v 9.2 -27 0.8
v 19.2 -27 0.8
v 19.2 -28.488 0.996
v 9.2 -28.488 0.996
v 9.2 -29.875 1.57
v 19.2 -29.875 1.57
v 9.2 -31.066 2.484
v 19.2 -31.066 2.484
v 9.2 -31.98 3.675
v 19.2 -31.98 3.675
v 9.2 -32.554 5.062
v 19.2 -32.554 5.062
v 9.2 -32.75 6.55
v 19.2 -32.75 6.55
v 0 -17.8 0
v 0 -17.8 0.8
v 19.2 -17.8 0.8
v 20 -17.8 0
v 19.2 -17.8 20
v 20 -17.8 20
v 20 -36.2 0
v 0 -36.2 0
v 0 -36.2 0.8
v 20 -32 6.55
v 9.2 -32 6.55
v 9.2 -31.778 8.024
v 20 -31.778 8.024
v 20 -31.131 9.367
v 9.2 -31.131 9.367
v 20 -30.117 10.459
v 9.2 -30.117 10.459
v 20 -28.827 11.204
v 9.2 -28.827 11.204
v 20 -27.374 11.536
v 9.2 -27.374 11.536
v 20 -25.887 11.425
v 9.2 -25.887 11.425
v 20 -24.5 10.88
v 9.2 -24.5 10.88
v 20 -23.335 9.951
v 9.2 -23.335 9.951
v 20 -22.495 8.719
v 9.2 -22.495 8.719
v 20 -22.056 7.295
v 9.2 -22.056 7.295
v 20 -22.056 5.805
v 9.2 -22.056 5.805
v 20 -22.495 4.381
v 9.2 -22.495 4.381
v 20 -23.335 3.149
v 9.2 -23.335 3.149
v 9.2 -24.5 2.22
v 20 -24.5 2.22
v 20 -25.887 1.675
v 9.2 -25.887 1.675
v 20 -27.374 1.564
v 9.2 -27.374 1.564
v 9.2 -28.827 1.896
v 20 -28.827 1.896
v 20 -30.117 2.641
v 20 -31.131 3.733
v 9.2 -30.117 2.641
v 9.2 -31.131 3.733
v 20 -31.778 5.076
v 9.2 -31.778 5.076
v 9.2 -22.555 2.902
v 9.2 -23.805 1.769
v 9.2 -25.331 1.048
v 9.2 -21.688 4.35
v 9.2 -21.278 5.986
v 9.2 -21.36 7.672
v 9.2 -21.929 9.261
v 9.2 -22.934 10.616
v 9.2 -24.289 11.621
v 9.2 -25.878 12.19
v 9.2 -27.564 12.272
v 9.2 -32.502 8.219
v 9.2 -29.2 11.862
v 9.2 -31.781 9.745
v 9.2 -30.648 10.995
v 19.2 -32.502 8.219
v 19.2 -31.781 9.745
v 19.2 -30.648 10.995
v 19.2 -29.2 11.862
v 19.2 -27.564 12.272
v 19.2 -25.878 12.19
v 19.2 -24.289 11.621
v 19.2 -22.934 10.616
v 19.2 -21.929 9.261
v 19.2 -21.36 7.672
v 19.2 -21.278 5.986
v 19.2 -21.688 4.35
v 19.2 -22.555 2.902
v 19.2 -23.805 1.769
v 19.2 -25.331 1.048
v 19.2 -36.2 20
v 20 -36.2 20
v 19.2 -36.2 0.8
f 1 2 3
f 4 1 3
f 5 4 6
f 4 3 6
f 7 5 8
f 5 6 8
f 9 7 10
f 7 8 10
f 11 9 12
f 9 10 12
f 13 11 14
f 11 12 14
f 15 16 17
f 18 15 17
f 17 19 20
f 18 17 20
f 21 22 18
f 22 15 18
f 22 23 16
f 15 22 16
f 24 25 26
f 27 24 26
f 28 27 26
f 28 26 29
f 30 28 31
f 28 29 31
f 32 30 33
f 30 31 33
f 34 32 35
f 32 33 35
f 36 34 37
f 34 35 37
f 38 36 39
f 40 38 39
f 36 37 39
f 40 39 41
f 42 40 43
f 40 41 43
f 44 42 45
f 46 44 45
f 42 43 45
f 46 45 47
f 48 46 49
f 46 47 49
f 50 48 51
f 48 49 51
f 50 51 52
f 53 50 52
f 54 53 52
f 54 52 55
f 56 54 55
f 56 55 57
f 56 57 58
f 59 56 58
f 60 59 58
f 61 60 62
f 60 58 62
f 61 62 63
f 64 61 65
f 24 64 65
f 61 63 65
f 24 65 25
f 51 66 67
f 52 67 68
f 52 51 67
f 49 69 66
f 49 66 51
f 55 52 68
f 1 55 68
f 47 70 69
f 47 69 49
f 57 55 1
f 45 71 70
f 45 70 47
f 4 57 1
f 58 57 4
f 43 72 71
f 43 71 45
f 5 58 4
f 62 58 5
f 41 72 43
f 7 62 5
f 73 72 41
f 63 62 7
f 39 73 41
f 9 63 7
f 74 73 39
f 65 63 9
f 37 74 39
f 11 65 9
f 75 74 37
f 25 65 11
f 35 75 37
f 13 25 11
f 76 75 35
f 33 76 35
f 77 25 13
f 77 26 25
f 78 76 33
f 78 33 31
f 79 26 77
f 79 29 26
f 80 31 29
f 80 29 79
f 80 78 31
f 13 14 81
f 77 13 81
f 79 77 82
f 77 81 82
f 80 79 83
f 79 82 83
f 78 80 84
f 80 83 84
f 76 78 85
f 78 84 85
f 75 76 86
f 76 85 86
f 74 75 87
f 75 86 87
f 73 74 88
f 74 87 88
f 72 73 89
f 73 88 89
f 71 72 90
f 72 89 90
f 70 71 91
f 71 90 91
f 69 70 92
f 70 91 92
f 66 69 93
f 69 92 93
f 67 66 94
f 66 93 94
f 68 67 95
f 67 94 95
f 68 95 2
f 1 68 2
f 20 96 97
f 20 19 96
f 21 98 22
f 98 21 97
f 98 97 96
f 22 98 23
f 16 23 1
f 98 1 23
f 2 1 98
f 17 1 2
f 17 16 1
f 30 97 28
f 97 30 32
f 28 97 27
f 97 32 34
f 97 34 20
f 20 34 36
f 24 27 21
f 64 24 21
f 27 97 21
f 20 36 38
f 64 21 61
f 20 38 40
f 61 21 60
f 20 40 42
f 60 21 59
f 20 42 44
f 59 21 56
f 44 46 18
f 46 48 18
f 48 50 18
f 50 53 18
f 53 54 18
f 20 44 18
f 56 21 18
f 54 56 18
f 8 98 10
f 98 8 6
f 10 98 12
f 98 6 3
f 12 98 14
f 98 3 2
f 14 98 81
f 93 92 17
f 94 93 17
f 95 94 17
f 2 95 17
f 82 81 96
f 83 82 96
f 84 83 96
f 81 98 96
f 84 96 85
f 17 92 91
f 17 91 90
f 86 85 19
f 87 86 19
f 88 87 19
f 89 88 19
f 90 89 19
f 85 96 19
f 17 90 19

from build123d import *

# Parameters (mm, degrees)
SKETCH003_W     = 40
SKETCH003_H     = 100
PAD002_DEPTH    = 20
SKETCH004_W     = 38.4
SKETCH004_H     = 98.4
POCKET001_DEPTH = 19.2
SKETCH006_R     = 5.75
PAD003_DEPTH    = 10
SKETCH009_R     = 5
POCKET004_DEPTH = 10.8
FILLET001_R     = 5
POCKET005_DEPTH = 20.001


with BuildPart() as part:
    # Sketch003 → Pad002 (new body)
    with BuildSketch(Plane.XY):
        Rectangle(SKETCH003_W, SKETCH003_H)
    extrude(amount=PAD002_DEPTH)

    # Sketch004 (on Face6 of Pad002) → Pocket001 (cut)
    with BuildSketch(Plane.XY.offset(20)):
        Rectangle(SKETCH004_W, SKETCH004_H)
    extrude(amount=-POCKET001_DEPTH, mode=Mode.SUBTRACT)

    # Sketch006 (on Face7 of Pocket001) → Pad003 (join)
    with BuildSketch(Plane(origin=(19.2, -2, 0), x_dir=(0, -1, 0), z_dir=(-1, 0, 0))):
        with Locations((25, 6.55)):
            Circle(SKETCH006_R)
    extrude(amount=PAD003_DEPTH)

    # Sketch009 (on Face13 of Pad003) → Pocket004 (cut)
    with BuildSketch(Plane(origin=(9.2, 0, 0), x_dir=(0, -1, 0), z_dir=(-1, 0, 0))):
        with Locations((27, 6.55)):
            Circle(SKETCH009_R)
    extrude(amount=-POCKET004_DEPTH, mode=Mode.SUBTRACT)

    # Fillet001
    fillet001_edges = [part.edges().sort_by_distance(p)[0] for p in [
        (0, 50, 0),
        (0, -50, 0),
        (0, -49.2, 0.8),
        (0, 49.2, 0.8),
    ]]
    fillet(fillet001_edges, radius=FILLET001_R)

    # Sketch010 (on Face4 of Fillet001) → Pocket005 (cut, through all)
    with BuildSketch(Plane.XY.offset(20)):
        Polygon((-20, 50), (-20, -50), (20, -50), (20, -36.2), (0, -36.2), (0, -17.8), (20, -17.8), (20, 50), align=None)
    extrude(amount=-POCKET005_DEPTH, mode=Mode.SUBTRACT)


solid = part.part
